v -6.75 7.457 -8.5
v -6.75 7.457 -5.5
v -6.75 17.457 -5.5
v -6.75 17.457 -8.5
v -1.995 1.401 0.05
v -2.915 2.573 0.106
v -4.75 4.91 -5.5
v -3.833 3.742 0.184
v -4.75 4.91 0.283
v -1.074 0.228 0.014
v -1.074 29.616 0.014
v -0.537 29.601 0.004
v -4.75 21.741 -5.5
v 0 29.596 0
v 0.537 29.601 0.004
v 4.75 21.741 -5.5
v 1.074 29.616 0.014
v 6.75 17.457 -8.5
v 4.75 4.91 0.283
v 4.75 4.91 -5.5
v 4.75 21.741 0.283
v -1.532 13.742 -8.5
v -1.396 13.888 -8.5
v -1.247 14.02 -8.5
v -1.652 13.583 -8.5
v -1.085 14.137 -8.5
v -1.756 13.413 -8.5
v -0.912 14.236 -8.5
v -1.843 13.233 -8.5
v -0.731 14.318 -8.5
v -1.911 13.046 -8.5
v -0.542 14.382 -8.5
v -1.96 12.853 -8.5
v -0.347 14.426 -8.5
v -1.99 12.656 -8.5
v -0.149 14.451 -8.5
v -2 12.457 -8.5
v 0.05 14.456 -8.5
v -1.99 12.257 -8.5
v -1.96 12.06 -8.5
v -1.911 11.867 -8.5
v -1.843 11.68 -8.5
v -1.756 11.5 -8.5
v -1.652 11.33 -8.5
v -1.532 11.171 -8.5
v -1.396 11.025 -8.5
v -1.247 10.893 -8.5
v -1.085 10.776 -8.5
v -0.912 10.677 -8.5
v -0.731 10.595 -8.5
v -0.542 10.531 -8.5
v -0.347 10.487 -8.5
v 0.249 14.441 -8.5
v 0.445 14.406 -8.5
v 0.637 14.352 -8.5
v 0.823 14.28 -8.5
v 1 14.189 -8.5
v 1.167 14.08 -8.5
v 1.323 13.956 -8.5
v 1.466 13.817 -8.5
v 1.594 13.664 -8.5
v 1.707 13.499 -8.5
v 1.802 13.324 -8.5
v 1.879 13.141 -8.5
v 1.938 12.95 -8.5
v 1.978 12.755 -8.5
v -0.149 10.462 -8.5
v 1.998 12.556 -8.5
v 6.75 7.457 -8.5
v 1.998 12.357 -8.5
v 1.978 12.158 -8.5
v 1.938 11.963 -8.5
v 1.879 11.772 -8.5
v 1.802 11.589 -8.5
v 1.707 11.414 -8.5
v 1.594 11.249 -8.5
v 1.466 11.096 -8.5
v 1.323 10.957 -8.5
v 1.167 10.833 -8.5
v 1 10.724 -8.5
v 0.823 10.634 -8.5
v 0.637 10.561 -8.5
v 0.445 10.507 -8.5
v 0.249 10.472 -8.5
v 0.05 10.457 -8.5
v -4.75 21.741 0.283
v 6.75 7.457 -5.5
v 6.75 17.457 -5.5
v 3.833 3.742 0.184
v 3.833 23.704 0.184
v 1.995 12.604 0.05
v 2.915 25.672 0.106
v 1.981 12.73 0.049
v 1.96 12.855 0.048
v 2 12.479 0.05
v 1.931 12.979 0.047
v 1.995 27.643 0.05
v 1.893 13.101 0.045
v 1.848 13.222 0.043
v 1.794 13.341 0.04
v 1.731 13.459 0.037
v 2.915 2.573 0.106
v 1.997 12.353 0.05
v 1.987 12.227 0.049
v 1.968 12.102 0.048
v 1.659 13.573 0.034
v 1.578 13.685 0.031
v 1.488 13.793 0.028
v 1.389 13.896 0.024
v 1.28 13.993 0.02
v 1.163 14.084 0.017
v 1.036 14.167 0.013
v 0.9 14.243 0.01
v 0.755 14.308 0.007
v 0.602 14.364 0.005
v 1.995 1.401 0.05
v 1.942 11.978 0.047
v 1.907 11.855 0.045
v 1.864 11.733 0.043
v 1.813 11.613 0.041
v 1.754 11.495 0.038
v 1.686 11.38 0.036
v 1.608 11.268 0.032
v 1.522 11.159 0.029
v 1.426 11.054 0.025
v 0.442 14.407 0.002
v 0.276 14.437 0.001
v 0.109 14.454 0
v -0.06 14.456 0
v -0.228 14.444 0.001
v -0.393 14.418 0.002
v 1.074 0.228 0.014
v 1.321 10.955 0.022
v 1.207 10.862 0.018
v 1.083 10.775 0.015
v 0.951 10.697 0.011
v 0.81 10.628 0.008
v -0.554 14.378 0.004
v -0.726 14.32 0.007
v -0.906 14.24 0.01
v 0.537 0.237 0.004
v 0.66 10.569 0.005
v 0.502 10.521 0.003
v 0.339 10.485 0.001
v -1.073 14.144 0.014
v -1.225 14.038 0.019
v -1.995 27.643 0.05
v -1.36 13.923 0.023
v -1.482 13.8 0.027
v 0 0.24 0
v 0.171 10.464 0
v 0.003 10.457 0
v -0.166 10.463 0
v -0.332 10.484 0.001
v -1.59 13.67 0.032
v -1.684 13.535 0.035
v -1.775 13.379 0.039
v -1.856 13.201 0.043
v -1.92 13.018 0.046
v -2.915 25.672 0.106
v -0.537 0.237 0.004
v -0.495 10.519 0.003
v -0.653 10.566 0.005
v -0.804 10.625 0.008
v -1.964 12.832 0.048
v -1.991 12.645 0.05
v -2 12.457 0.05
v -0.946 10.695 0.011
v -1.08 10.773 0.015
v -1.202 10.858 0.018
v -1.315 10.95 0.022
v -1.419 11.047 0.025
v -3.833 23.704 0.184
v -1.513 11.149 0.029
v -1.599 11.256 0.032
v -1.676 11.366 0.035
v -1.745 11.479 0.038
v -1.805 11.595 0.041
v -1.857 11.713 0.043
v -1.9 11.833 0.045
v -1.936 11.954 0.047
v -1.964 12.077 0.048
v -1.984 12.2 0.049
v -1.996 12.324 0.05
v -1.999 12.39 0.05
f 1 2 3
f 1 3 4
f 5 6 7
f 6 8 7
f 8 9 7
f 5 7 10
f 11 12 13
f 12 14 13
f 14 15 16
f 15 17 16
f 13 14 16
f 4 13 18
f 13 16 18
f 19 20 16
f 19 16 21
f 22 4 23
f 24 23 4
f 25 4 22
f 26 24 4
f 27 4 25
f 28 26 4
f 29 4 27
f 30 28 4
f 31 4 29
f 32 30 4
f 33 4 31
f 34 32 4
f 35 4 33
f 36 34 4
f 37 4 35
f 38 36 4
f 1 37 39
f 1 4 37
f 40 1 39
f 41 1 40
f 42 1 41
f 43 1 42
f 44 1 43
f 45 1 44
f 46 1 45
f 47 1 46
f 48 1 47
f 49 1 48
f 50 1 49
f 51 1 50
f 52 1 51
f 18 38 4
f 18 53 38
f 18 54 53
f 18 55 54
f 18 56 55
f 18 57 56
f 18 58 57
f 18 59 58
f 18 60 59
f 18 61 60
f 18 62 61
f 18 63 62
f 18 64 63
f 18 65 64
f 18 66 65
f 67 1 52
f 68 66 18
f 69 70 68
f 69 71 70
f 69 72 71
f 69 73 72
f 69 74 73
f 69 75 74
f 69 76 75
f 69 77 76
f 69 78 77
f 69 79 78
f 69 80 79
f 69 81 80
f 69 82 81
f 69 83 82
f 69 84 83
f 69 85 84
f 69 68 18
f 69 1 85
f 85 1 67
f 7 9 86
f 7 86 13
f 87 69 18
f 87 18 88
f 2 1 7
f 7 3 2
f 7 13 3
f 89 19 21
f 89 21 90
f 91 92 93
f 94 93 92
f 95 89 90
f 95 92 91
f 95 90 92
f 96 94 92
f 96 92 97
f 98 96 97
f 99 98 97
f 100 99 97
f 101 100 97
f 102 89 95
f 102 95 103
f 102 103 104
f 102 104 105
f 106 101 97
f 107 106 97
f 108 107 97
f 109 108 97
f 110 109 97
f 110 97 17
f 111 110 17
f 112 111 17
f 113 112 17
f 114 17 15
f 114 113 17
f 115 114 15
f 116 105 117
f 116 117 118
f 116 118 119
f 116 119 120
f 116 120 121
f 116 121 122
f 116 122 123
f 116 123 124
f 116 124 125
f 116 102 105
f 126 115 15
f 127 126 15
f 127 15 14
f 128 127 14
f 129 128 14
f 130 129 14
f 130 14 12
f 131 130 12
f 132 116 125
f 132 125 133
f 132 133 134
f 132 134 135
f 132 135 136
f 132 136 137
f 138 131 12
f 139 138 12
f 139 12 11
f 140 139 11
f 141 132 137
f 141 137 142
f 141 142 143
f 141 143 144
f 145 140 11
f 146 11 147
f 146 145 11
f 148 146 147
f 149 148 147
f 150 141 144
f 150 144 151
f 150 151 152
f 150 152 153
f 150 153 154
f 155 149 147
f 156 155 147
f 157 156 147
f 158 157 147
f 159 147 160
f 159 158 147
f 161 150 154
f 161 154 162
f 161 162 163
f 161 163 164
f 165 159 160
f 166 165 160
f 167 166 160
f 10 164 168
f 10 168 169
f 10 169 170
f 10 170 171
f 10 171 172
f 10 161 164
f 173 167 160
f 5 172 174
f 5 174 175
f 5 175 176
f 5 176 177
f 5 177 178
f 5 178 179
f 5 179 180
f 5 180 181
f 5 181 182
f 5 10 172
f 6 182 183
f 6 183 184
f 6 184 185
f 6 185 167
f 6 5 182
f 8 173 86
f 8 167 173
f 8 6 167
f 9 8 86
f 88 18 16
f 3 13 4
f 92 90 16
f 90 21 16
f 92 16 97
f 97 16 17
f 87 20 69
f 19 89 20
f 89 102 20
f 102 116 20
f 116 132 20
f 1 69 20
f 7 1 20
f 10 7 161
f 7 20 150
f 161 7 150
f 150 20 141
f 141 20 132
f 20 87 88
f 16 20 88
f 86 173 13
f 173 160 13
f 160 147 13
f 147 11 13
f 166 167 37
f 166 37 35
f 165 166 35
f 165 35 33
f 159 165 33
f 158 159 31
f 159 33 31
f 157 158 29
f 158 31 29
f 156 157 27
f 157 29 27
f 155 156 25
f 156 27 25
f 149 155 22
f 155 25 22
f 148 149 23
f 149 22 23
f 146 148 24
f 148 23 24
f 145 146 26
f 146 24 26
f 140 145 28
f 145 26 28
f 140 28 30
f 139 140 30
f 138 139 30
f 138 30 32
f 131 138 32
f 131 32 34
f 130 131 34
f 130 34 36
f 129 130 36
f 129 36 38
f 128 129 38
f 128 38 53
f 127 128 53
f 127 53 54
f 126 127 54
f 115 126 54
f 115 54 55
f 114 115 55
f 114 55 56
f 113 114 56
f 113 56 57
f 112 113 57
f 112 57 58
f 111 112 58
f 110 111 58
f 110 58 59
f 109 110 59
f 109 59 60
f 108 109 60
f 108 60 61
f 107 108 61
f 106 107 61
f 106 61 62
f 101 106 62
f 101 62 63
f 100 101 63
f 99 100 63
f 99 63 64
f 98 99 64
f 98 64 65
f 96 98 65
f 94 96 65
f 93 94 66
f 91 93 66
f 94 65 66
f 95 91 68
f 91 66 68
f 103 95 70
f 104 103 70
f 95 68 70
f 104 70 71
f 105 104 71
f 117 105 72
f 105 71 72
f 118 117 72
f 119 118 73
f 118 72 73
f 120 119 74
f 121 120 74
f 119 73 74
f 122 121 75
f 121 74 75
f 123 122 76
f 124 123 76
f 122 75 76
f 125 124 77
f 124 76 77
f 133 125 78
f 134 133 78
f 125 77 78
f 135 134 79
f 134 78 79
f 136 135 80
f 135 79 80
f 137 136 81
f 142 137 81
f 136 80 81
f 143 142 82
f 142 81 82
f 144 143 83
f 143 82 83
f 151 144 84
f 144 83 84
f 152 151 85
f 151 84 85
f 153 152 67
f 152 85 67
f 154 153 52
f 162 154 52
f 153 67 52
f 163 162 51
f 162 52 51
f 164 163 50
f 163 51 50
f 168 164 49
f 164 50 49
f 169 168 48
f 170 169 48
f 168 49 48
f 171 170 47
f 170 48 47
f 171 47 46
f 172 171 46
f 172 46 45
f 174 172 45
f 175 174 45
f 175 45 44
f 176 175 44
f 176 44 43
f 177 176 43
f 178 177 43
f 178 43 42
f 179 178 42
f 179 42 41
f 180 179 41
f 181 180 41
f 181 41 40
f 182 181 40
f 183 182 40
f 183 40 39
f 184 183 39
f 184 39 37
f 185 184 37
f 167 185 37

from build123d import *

# Parameters (mm, degrees)
BOSS_EXTRUDE1_DEPTH = 30
SKETCH2_OUTSIDE_W   = 17.593
SKETCH2_OUTSIDE_H   = 38.81
CUT_EXTRUDE1_DEPTH  = 15
SKETCH3_OUTSIDE_W   = 22.31
SKETCH3_OUTSIDE_H   = 38.81
SKETCH3_OUTSIDE_R   = 2
CUT_EXTRUDE2_DEPTH  = 15


with BuildPart() as part:
    # Sketch1 → Boss-Extrude1 (new body)
    with BuildSketch(Plane(origin=(0, 0, 0), x_dir=(1, 0, 0), z_dir=(0, 1, 0))):
        with BuildLine():
            Line((-4.75, -0.283032593), (-4.75, 5.5))
            Line((-4.75, 5.5), (-6.75, 5.5))
            Line((-6.75, 5.5), (-6.75, 8.5))
            Line((-6.75, 8.5), (6.75, 8.5))
            Line((6.75, 8.5), (6.75, 5.5))
            Line((6.75, 5.5), (4.75, 5.5))
            Line((4.75, 5.5), (4.75, -0.283032593))
            ThreePointArc((4.75, -0.283032593), (0, 0), (-4.75, -0.283032593))
        make_face()
    extrude(amount=BOSS_EXTRUDE1_DEPTH)

    # Sketch2 outside → Cut-Extrude1 (cut)
    with BuildSketch(Plane(origin=(6.75, 0, 0), x_dir=(0, 0, -1), z_dir=(1, 0, 0))):
        with Locations((4.1085, 15)):
            Rectangle(SKETCH2_OUTSIDE_W, SKETCH2_OUTSIDE_H)
        Polygon((-0.283032593, 30), (8.5, 17.456529509), (8.5, 7.456529509), (-0.283032593, 0), align=None, mode=Mode.SUBTRACT)
    extrude(amount=-CUT_EXTRUDE1_DEPTH, mode=Mode.SUBTRACT)

    # Sketch3 outside → Cut-Extrude2 (cut)
    # profile 1 of 2: a face of its own
    with BuildSketch(Plane(origin=(0, 0, -8.5), x_dir=(-1, 0, 0), z_dir=(0, 0, -1))):
        with Locations((0, 15)):
            Rectangle(SKETCH3_OUTSIDE_W, SKETCH3_OUTSIDE_H)
        Polygon((-6.75, 17.456529509), (-0.894644938, 30), (0.894644938, 30), (6.75, 17.456529509), (6.75, 7.456529509), (0.894644938, 0), (-0.894644938, 0), (-6.75, 7.456529509), align=None, mode=Mode.SUBTRACT)
    # profile 2 of 2: a face of its own
    with BuildSketch(Plane(origin=(0, 0, -8.5), x_dir=(-1, 0, 0), z_dir=(0, 0, -1))):
        with Locations((0, 12.456529509)):
            Circle(SKETCH3_OUTSIDE_R)
    extrude(amount=-CUT_EXTRUDE2_DEPTH, mode=Mode.SUBTRACT)


solid = part.part
